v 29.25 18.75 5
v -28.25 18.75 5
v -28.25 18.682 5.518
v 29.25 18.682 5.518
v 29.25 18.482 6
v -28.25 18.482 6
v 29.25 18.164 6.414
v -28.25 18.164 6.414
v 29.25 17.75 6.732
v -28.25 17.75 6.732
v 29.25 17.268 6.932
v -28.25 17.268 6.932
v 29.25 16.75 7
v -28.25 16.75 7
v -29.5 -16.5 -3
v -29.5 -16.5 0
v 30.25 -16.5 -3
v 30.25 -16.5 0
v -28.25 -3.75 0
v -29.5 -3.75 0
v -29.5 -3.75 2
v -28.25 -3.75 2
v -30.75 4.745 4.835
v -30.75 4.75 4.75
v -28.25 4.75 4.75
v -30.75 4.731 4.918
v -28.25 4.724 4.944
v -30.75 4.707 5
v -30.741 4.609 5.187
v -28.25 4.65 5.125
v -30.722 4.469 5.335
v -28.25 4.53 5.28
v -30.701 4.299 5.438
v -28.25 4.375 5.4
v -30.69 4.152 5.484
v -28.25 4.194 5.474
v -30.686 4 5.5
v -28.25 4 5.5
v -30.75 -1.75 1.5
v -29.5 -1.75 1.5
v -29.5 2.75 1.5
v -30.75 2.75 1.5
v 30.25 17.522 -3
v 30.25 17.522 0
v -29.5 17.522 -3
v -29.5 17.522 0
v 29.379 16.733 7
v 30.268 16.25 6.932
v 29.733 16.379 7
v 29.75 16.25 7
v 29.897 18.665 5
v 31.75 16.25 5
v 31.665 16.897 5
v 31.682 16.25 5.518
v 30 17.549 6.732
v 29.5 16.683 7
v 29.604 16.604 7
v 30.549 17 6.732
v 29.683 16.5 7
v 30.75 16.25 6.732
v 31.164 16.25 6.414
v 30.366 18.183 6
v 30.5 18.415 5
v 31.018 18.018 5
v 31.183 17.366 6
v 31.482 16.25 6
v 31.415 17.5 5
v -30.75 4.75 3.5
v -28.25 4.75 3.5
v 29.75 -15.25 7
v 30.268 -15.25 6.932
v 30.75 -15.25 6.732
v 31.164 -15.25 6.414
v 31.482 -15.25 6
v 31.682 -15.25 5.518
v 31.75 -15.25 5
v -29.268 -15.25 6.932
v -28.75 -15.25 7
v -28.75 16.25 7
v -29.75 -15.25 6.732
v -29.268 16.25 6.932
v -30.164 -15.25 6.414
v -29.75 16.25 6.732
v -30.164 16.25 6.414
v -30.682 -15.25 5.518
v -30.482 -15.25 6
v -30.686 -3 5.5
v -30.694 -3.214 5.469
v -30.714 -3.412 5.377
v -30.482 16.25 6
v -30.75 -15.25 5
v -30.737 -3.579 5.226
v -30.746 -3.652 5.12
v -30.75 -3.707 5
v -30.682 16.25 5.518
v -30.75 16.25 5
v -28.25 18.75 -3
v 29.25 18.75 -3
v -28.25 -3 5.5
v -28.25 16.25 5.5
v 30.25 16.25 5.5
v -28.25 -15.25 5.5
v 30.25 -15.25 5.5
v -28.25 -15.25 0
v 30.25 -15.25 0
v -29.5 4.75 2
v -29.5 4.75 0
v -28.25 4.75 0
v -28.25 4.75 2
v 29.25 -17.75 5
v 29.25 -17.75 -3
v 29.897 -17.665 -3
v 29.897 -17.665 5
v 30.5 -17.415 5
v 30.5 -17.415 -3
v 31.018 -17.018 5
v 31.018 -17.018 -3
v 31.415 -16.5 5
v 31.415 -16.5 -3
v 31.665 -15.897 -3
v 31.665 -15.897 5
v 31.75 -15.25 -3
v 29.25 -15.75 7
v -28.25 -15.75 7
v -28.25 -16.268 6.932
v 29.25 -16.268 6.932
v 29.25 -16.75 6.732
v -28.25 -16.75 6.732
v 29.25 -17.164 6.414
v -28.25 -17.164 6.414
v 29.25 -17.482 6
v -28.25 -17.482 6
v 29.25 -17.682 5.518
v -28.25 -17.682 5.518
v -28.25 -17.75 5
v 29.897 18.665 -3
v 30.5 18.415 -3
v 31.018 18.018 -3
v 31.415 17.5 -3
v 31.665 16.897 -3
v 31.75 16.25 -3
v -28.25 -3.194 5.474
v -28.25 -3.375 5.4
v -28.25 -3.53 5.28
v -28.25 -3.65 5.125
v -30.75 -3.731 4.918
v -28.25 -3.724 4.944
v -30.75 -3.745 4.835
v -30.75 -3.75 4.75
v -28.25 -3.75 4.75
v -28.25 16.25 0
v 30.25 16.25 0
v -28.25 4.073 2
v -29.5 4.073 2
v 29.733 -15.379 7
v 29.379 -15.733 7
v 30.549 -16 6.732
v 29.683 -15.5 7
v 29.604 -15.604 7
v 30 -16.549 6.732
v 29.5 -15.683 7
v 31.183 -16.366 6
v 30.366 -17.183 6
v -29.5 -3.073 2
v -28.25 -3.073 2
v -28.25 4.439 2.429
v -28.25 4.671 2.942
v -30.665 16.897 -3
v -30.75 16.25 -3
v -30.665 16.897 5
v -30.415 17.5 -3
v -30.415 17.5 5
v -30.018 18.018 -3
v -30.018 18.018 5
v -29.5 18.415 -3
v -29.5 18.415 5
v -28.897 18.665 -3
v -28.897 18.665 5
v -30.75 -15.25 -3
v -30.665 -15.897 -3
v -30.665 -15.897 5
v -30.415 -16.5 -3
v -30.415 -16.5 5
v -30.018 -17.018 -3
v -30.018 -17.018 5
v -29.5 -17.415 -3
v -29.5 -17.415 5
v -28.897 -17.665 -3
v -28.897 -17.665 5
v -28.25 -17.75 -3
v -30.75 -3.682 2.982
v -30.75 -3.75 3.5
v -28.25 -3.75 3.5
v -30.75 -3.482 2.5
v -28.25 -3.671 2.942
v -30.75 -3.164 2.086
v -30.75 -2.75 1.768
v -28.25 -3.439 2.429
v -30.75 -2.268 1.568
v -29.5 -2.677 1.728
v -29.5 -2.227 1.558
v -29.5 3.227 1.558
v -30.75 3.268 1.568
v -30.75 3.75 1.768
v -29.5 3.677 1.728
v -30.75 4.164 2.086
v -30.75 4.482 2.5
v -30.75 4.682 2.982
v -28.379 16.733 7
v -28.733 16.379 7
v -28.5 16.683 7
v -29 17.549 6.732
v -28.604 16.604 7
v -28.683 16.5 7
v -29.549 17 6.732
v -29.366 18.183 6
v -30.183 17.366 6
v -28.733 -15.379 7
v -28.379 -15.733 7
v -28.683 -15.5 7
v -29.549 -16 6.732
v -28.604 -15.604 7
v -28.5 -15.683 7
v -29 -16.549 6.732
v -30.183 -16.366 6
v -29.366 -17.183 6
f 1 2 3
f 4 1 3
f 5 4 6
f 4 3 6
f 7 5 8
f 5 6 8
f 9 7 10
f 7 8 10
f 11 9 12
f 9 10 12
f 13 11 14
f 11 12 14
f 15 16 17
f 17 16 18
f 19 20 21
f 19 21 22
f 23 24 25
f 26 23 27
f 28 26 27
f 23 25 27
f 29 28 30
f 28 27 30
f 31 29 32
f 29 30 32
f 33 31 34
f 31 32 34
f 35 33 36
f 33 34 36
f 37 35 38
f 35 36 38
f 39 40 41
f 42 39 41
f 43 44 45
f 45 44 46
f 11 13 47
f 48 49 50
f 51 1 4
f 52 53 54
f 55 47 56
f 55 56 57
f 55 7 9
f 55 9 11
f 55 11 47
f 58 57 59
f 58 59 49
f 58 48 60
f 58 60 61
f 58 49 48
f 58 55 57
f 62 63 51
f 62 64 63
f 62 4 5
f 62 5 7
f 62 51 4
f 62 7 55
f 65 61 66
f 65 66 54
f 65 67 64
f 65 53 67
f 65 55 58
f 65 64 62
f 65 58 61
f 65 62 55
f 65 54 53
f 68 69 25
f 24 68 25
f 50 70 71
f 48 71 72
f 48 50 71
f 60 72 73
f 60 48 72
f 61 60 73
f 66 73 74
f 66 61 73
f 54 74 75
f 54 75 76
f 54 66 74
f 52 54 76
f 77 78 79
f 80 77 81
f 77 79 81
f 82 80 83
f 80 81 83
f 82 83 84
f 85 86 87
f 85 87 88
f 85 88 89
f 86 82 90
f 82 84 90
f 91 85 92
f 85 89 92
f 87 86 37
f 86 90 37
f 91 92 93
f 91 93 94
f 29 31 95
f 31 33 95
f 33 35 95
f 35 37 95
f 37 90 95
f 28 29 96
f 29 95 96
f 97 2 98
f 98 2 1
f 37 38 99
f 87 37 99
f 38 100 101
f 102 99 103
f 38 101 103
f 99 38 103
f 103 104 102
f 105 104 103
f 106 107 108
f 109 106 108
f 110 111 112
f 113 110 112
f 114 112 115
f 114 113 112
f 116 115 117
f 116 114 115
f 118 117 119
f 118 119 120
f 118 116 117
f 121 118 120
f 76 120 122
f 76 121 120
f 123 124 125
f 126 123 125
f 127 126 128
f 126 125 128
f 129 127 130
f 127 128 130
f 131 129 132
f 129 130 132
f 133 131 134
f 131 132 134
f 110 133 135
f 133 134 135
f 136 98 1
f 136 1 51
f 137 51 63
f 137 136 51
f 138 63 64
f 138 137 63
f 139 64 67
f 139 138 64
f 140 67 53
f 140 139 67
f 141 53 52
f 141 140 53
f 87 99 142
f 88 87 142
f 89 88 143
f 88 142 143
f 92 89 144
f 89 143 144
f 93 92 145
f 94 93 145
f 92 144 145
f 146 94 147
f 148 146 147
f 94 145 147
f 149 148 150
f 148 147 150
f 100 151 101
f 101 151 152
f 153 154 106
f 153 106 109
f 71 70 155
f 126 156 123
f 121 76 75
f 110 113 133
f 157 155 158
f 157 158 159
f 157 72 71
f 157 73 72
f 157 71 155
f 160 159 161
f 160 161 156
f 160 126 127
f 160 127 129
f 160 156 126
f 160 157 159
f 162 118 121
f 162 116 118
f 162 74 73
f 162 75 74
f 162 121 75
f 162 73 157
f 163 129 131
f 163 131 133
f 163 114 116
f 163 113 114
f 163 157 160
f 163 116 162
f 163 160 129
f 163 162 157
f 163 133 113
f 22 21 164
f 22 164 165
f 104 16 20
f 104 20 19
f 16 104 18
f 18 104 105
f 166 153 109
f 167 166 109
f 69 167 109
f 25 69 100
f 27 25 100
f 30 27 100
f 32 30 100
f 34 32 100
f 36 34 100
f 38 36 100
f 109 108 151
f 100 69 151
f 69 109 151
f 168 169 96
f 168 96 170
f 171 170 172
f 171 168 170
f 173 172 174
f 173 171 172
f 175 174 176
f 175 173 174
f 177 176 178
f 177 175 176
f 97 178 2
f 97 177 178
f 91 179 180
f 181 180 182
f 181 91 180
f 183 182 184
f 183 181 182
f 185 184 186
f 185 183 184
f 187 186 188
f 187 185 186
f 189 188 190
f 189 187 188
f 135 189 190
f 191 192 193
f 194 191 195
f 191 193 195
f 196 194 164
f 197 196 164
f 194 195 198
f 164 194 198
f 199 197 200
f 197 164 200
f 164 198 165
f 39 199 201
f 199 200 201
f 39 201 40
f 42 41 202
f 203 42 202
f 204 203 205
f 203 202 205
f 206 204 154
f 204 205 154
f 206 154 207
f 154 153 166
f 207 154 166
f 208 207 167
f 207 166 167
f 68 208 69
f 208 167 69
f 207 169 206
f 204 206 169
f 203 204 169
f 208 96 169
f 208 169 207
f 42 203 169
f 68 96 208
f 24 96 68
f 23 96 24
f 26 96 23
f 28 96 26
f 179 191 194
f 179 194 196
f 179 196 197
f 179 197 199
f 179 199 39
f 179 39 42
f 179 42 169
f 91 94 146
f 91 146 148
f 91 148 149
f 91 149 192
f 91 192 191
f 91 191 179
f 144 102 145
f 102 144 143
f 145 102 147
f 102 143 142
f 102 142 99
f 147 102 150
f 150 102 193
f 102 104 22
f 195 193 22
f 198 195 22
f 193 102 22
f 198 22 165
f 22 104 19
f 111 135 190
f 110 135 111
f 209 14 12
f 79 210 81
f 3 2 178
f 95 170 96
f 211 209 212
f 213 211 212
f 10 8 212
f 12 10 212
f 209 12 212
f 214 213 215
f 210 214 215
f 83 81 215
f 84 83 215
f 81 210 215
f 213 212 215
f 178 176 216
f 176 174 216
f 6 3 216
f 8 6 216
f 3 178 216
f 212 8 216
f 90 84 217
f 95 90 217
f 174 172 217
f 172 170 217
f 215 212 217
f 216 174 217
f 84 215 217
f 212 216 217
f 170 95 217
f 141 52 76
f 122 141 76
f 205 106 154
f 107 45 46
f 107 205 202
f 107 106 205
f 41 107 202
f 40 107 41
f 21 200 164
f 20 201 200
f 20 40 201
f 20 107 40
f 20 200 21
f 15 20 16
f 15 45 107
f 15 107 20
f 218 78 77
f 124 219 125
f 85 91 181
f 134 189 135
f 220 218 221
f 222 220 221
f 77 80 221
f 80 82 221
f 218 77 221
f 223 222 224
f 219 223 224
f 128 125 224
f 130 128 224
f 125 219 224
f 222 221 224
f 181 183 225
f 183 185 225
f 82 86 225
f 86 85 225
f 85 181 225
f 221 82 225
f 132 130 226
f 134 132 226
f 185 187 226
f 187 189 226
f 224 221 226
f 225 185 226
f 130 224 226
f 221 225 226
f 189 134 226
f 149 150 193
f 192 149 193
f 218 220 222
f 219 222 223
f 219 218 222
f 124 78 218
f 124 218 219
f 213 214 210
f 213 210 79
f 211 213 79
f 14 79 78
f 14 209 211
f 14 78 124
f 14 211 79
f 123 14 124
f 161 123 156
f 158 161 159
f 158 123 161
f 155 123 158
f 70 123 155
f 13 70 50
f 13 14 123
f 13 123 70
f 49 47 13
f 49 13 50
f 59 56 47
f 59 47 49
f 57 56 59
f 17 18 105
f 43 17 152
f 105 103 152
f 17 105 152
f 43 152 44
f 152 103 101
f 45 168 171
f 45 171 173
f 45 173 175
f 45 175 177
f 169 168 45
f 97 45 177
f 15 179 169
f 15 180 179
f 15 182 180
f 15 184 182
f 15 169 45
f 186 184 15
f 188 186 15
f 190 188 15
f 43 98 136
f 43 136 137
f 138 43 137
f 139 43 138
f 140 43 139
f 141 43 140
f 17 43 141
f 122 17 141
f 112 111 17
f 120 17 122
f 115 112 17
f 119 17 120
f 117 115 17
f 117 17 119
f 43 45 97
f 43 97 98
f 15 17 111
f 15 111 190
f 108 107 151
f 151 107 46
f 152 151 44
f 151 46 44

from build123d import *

# Parameters (mm, degrees)
F0_W         = 62.5
F0_H         = 36.5
F0_W_2       = 58.5
F0_H_2       = 31.5
F1_DEPTH     = 7
F3_DEPTH     = 1.5
F4_W         = 62.5
F4_H         = 36.5
F5_DEPTH     = 3
F7_DEPTH     = 2.5
F8_R         = 2.5
F9_T1_DEPTH  = 57.5
F9_T3_DEPTH  = 31.5
F9_T6_ANGLE  = 90
F9_T8_ANGLE  = 90
F9_T10_ANGLE = 90
F9_T12_ANGLE = 90
F10_W        = 1.25
F10_H        = 8.5
F11_DEPTH    = 2


# Not quite as in the source:
# - a fillet or chamfer that OpenCascade refuses, or shapes differently, is made with other operations: its cross-section is extruded or revolved along the edge and cut away or added


with BuildPart() as f1:
    # F0 (on Top) → F1 (new body)
    with BuildSketch(Plane.XY):
        with Locations((0.5, 0.5)):
            Rectangle(F0_W, F0_H)
        with Locations((1, 0.5)):
            Rectangle(F0_W_2, F0_H_2, mode=Mode.SUBTRACT)
    extrude(amount=F1_DEPTH)

    # F2 (on face) → F3 (join)
    with BuildSketch(Plane.XY.offset(7)):
        Polygon((30.25, 16.25), (-28.25, 16.25), (-28.25, -15.25), (30.25, -15.25), (30.25, -6), (30.25, 7), align=None)
    extrude(amount=-F3_DEPTH)

    # F4 (on face) → F5 (join)
    with BuildSketch(Plane(origin=(0, 0, 0), x_dir=(1, 0, 0), z_dir=(0, 0, -1))):
        with Locations((0.5, -0.5)):
            Rectangle(F4_W, F4_H)
        Polygon((-29.5, -17.522141248), (-29.5, 16.5), (30.25, 16.5), (30.25, 15.25), (30.25, -16.25), (30.25, -17.522141248), align=None, mode=Mode.SUBTRACT)
    extrude(amount=F5_DEPTH)

    # F6 (on face) → F7 (cut)
    with BuildSketch(Plane.YZ.offset(-28.25)):
        with BuildLine():
            Line((4, 5.5), (-3, 5.5))
            ThreePointArc((-3, 5.5), (-3.5303300859, 5.2803300859), (-3.75, 4.75))
            Line((-3.75, 4.75), (-3.75, 3.5))
            ThreePointArc((-3.75, 3.5), (-3.1642135624, 2.0857864376), (-1.75, 1.5))
            Line((-1.75, 1.5), (2.75, 1.5))
            ThreePointArc((2.75, 1.5), (4.1642135624, 2.0857864376), (4.75, 3.5))
            Line((4.75, 3.5), (4.75, 4.75))
            ThreePointArc((4.75, 4.75), (4.5303300859, 5.2803300859), (4, 5.5))
        make_face()
    extrude(amount=-F7_DEPTH, mode=Mode.SUBTRACT)

    # F8
    f8_edges = [f1.edges().sort_by_distance(p)[0] for p in [
        (-30.75, 18.75, 2),
        (-30.75, -17.75, 2),
        (31.75, 18.75, 2),
        (31.75, -17.75, 2),
    ]]
    fillet(f8_edges, radius=F8_R)

    # F9: fillet of radius 2 on 8 edges, made by hand

    # F9_s2 → F9_t1 (cut)
    with BuildSketch(Plane.YZ.offset(-28.25)):
        with BuildLine():
            ThreePointArc((-15.75, 7), (-17.1642135624, 6.4142135624), (-17.75, 5))
            Line((-17.75, 5), (-17.75, 7))
            Line((-17.75, 7), (-15.75, 7))
        make_face()
        with BuildLine():
            ThreePointArc((18.75, 5), (18.1642135624, 6.4142135624), (16.75, 7))
            Line((16.75, 7), (18.75, 7))
            Line((18.75, 7), (18.75, 5))
        make_face()
    extrude(amount=F9_T1_DEPTH, mode=Mode.SUBTRACT)

    # F9_s4 → F9_t3 (cut)
    with BuildSketch(Plane.XZ.offset(-16.25)):
        with BuildLine():
            ThreePointArc((29.75, 7), (31.1642135624, 6.4142135624), (31.75, 5))
            Line((31.75, 5), (31.75, 7))
            Line((31.75, 7), (29.75, 7))
        make_face()
        with BuildLine():
            ThreePointArc((-28.75, 7), (-30.1642135624, 6.4142135624), (-30.75, 5))
            Line((-30.75, 5), (-30.75, 7))
            Line((-30.75, 7), (-28.75, 7))
        make_face()
    extrude(amount=F9_T3_DEPTH, mode=Mode.SUBTRACT)

    # F9_s5 → F9_t6 (revolve, cut)
    with BuildSketch(Plane.YZ.offset(29.25)):
        with BuildLine():
            ThreePointArc((16.75, 7), (18.1642135624, 6.4142135624), (18.75, 5))
            Line((18.75, 5), (18.75, 7))
            Line((18.75, 7), (16.75, 7))
        make_face()
    revolve(axis=Axis((29.25, 16.25, 7), (0, 0, -1)), revolution_arc=F9_T6_ANGLE, mode=Mode.SUBTRACT)

    # F9_s7 → F9_t8 (revolve, cut)
    with BuildSketch(Plane.YZ.offset(-28.25)):
        with BuildLine():
            ThreePointArc((16.75, 7), (18.1642135624, 6.4142135624), (18.75, 5))
            Line((18.75, 5), (18.75, 7))
            Line((18.75, 7), (16.75, 7))
        make_face()
    revolve(axis=Axis((-28.25, 16.25, 7), (0, 0, 1)), revolution_arc=F9_T8_ANGLE, mode=Mode.SUBTRACT)

    # F9_s9 → F9_t10 (revolve, cut)
    with BuildSketch(Plane.XZ.offset(15.25)):
        with BuildLine():
            ThreePointArc((29.75, 7), (31.1642135624, 6.4142135624), (31.75, 5))
            Line((31.75, 5), (31.75, 7))
            Line((31.75, 7), (29.75, 7))
        make_face()
    revolve(axis=Axis((29.25, -15.25, 7), (0, 0, -1)), revolution_arc=F9_T10_ANGLE, mode=Mode.SUBTRACT)

    # F9_s11 → F9_t12 (revolve, cut)
    with BuildSketch(Plane.XZ.offset(15.25)):
        with BuildLine():
            ThreePointArc((-28.75, 7), (-30.1642135624, 6.4142135624), (-30.75, 5))
            Line((-30.75, 5), (-30.75, 7))
            Line((-30.75, 7), (-28.75, 7))
        make_face()
    revolve(axis=Axis((-28.25, -15.25, 7), (0, 0, 1)), revolution_arc=F9_T12_ANGLE, mode=Mode.SUBTRACT)

    # F10 (on face) → F11 (cut)
    with BuildSketch(Plane(origin=(0, 0, 0), x_dir=(1, 0, 0), z_dir=(0, 0, -1))):
        with Locations((-28.875, -0.5)):
            Rectangle(F10_W, F10_H)
    extrude(amount=-F11_DEPTH, mode=Mode.SUBTRACT)


solid = f1.part
